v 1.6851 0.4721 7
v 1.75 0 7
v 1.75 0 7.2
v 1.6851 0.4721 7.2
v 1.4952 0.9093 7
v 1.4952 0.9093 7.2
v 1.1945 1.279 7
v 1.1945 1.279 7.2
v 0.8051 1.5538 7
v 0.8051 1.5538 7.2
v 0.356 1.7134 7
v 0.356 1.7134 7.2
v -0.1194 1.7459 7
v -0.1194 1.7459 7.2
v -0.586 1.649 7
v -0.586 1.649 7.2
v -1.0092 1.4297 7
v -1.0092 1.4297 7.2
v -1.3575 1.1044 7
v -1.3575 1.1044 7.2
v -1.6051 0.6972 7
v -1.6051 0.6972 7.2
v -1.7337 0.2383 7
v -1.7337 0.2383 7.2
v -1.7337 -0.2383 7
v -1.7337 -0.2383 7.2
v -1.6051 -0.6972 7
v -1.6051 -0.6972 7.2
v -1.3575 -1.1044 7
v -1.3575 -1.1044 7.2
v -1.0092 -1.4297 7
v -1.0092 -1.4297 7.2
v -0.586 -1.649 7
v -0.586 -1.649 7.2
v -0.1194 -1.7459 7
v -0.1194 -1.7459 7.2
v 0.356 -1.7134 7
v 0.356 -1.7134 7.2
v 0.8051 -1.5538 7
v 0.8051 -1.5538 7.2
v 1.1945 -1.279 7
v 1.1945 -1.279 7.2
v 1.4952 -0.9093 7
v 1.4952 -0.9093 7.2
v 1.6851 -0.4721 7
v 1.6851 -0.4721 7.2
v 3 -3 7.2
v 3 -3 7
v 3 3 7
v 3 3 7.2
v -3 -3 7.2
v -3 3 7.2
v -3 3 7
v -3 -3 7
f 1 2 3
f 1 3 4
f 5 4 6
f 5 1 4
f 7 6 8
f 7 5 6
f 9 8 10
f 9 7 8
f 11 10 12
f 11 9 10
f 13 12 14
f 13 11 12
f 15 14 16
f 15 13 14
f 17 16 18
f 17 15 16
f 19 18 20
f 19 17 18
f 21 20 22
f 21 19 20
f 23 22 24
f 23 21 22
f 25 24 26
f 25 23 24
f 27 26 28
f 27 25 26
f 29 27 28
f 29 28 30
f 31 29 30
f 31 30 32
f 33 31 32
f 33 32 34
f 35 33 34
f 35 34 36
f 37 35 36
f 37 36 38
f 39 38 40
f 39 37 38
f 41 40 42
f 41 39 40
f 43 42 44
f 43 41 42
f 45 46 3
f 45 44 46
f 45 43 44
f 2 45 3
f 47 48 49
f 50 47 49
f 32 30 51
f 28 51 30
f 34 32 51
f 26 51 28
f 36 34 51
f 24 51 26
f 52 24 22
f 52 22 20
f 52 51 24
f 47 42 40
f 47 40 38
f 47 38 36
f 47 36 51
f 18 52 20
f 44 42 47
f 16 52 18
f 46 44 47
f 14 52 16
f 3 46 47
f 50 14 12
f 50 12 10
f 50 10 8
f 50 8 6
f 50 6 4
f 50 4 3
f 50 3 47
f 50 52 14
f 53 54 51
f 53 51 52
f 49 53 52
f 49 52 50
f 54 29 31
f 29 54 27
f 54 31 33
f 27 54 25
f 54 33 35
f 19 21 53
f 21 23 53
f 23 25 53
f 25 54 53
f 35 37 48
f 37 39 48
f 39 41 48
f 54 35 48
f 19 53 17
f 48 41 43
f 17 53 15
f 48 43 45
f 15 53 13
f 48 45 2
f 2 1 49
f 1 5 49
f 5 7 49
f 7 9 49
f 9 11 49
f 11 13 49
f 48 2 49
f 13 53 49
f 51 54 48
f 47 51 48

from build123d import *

# Parameters (mm, degrees)
SKETCH004_R  = 1.75
PAD005_DEPTH = 2
SKETCH002_W  = 6
SKETCH002_H  = 6
PAD003_DEPTH = 0.2


with BuildPart() as body004:
    # Sketch004 → Pad005 (new body)
    with BuildSketch(Plane.XY):
        Circle(SKETCH004_R)
    extrude(amount=PAD005_DEPTH)


with BuildPart() as body004_1:
    # Body004 placement: moved
    add(body004.part.moved(Location((0, 0, 7))))


with BuildPart() as cut:
    # Sketch002 → Pad003 (new body)
    with BuildSketch(Plane.XY):
        Rectangle(SKETCH002_W, SKETCH002_H)
    extrude(amount=PAD003_DEPTH)


with BuildPart() as cut_1:
    # Body002 placement: moved
    add(cut.part.moved(Location((0, 0, 7))))

    # Cut: cut Body004
    add(body004_1.part, mode=Mode.SUBTRACT)


solid = cut_1.part
